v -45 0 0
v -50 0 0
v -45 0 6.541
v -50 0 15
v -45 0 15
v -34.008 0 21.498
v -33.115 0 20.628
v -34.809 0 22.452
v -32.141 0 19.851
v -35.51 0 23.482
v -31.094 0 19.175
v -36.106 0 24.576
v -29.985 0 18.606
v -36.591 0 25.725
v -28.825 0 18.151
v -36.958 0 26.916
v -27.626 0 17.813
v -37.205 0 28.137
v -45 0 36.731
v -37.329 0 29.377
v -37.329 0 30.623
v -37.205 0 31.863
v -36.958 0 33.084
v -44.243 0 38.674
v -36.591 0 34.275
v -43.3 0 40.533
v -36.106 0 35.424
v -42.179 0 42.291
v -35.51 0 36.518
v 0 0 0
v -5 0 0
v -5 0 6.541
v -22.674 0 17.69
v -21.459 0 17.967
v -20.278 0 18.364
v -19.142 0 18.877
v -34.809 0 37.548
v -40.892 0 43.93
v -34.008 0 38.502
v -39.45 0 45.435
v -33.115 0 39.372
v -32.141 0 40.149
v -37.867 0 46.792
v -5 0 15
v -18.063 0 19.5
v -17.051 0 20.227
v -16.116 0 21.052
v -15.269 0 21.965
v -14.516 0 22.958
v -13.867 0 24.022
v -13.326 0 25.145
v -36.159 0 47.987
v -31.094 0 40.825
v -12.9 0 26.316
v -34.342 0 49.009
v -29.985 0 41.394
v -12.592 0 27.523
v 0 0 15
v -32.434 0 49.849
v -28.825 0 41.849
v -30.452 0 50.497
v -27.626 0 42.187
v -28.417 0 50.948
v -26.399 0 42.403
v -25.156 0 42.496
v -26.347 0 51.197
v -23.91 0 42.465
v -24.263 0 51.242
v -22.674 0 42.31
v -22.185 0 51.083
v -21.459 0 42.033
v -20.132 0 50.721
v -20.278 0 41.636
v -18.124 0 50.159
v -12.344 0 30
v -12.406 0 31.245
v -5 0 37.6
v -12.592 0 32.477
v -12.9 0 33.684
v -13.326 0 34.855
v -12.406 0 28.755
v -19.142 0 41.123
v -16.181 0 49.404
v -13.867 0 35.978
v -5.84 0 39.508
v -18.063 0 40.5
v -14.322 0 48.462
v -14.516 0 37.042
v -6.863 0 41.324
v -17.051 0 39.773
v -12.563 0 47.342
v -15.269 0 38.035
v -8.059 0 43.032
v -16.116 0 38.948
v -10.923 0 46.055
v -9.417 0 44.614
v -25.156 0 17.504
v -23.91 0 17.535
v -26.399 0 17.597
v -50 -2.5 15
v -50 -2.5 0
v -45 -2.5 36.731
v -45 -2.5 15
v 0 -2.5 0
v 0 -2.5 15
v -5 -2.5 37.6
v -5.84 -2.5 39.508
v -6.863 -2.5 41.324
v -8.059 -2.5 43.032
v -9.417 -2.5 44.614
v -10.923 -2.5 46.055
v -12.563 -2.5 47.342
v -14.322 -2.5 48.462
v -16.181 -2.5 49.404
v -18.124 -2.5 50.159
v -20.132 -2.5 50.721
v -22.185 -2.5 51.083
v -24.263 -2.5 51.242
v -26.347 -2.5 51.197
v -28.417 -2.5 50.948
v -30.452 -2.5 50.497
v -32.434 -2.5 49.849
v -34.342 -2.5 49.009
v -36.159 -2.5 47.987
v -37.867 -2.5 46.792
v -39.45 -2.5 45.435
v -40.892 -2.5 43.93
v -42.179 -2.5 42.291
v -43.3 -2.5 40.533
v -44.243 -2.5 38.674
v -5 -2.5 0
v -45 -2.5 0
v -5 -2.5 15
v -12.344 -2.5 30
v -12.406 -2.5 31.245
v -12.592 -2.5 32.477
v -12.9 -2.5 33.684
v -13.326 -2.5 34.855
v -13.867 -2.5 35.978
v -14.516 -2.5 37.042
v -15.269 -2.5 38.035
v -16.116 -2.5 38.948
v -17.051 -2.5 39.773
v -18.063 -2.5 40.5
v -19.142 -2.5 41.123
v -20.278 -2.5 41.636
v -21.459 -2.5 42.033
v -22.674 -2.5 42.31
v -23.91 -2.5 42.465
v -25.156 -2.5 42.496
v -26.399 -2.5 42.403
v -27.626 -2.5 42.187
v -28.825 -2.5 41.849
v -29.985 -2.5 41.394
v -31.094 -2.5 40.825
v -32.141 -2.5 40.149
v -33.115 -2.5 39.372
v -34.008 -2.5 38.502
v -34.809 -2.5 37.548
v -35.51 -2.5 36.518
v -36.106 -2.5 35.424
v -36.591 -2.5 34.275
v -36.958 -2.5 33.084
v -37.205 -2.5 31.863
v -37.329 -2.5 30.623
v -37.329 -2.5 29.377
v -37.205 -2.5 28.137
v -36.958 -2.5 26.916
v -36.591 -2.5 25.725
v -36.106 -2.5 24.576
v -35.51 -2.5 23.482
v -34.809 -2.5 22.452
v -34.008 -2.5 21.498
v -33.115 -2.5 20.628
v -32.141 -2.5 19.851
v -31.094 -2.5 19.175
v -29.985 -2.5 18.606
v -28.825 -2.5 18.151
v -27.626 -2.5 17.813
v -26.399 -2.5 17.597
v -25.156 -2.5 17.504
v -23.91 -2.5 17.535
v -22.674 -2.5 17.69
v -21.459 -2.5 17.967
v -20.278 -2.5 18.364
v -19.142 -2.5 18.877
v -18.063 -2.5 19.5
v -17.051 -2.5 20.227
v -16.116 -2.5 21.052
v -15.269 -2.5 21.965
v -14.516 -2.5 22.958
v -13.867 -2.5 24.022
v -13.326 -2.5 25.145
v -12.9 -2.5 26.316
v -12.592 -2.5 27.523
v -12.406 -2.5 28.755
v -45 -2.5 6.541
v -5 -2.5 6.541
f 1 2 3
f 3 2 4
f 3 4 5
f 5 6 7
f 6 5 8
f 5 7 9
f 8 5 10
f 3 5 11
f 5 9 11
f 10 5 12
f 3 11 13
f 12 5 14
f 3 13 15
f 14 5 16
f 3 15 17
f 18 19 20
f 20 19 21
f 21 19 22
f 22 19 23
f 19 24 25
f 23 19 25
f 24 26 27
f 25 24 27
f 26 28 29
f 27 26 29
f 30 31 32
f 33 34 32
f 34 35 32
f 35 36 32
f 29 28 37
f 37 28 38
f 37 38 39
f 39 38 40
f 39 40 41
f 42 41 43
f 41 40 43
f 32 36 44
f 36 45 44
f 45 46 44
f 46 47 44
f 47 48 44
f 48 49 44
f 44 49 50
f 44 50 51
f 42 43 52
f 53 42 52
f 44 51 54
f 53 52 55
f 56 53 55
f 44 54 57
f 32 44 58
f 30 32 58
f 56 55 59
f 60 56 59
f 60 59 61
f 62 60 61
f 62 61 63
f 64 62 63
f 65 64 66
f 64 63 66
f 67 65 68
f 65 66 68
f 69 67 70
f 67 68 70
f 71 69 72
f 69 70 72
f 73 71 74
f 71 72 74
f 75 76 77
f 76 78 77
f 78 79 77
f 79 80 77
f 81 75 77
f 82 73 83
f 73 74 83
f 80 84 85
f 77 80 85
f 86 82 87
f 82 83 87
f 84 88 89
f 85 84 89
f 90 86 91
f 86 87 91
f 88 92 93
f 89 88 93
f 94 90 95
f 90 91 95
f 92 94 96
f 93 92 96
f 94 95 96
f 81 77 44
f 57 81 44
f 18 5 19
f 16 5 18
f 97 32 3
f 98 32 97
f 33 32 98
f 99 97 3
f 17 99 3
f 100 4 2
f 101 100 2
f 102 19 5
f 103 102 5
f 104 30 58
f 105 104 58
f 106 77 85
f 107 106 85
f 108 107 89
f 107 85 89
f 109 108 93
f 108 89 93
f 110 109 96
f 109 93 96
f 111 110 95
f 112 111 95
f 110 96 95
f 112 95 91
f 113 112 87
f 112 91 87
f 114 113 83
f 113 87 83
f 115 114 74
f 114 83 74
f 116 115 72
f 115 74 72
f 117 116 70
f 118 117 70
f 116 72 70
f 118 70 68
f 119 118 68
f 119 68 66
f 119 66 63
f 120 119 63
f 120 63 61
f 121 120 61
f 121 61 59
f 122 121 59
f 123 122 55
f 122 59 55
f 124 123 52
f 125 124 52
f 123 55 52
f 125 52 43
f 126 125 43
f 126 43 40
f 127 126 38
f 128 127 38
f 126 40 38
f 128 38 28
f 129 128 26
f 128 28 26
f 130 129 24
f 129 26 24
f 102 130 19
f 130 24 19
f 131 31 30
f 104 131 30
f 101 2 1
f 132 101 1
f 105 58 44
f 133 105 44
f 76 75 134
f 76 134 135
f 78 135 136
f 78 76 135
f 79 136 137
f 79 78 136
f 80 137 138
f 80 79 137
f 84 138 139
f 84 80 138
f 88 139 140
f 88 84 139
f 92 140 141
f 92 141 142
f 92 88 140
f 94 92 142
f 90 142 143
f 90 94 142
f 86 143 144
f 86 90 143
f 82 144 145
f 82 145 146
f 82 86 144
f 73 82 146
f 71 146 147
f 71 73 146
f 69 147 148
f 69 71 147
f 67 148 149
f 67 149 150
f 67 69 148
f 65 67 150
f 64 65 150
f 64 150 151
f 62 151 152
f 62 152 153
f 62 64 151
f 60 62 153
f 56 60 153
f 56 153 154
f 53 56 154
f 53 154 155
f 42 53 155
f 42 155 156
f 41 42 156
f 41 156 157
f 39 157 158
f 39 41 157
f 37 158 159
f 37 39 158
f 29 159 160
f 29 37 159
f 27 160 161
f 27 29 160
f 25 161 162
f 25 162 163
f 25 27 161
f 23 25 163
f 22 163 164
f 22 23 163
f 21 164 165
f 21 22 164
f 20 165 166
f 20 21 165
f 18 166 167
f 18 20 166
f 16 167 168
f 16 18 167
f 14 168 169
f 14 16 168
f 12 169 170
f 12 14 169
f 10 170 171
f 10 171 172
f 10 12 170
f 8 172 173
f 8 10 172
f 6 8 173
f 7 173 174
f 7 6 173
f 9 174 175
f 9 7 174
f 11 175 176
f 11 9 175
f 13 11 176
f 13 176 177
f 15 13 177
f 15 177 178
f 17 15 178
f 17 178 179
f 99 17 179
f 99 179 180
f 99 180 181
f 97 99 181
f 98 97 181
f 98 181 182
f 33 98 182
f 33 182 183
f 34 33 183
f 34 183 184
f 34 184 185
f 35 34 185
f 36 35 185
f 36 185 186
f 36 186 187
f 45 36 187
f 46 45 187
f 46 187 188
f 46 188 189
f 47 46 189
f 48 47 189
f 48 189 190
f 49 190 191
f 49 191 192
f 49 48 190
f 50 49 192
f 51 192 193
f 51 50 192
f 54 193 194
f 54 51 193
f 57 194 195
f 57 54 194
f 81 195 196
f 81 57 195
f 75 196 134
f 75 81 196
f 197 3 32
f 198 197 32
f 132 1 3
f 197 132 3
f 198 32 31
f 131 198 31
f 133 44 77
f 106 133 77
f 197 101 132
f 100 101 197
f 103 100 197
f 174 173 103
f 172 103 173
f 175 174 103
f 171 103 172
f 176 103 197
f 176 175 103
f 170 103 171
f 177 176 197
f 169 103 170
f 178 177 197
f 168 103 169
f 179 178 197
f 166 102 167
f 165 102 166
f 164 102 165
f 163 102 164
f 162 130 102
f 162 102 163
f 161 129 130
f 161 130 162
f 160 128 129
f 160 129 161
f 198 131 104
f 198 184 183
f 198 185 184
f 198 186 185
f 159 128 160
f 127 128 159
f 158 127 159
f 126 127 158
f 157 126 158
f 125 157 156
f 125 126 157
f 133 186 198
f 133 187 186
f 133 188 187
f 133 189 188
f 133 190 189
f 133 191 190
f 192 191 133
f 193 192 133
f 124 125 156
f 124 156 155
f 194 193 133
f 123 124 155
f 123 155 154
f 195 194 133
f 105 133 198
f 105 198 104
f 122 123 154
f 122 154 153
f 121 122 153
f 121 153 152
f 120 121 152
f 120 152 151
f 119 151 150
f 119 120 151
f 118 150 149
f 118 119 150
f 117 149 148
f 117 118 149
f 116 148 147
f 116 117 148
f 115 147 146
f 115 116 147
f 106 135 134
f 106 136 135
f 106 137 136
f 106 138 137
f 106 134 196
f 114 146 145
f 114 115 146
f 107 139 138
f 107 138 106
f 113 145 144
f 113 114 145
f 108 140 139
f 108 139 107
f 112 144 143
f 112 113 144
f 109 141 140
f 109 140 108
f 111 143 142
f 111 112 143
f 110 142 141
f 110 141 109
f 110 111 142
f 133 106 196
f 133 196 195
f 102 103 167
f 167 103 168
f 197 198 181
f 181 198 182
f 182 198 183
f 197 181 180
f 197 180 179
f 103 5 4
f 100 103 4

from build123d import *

# Parameters (mm, degrees)
F0_R     = 12.5
F1_DEPTH = 2.5


with BuildPart() as f1:
    # F0 (on Front) → F1 (new body)
    with BuildSketch(Plane.XZ):
        with BuildLine():
            Line((-5, 0), (0, 0))
            Line((0, 0), (0, 15))
            Line((0, 15), (-5, 15))
            Line((-5, 15), (-5, 37.600264))
            ThreePointArc((-5, 37.600264), (-25.3058, 51.244989), (-45, 36.731459))
            Line((-45, 36.731459), (-45, 15))
            Line((-45, 15), (-50, 15))
            Line((-50, 15), (-50, 0))
            Line((-50, 0), (-45, 0))
            Line((-45, 0), (-45, 6.541304))
            Line((-45, 6.541304), (-5, 6.541304))
            Line((-5, 6.541304), (-5, 0))
        make_face()
        with Locations((-24.844357, 30)):
            Circle(F0_R, mode=Mode.SUBTRACT)
    extrude(amount=F1_DEPTH)


solid = f1.part
